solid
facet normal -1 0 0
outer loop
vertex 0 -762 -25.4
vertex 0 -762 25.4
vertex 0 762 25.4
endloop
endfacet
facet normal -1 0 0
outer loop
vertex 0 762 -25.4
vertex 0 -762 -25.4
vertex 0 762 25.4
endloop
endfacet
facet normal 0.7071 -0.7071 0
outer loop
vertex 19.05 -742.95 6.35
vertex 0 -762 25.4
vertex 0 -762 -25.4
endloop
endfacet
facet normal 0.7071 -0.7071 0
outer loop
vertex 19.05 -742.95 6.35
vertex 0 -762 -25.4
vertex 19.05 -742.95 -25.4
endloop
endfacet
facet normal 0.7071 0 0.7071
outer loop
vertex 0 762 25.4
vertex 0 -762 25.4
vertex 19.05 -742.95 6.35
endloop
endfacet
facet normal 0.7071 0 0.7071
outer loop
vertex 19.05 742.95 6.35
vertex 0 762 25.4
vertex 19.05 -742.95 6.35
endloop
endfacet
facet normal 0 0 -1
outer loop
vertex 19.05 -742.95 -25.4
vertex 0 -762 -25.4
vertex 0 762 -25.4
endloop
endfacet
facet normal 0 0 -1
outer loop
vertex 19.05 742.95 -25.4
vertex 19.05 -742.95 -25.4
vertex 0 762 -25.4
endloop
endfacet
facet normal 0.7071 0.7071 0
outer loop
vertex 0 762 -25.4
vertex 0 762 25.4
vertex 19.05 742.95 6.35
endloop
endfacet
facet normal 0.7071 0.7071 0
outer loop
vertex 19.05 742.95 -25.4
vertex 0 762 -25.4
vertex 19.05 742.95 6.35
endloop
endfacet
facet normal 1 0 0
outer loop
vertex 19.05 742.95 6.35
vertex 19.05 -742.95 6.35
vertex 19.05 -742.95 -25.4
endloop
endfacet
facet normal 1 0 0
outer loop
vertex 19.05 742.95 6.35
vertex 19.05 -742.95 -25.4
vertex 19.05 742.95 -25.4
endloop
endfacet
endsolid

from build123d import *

# Parameters (mm, degrees)
F0_W     = 1524
F0_H     = 50.8
F1_DEPTH = 19.05
F3_DEPTH = 50.801
F5_DEPTH = 1524.001


# Not quite as in the source:
# - a pattern or mirror of a feature is missing from the dataset's text; its kind, count and spacing are read off the source's solid


with BuildPart() as f1:
    # F0 (on Right) → F1 (new body)
    with BuildSketch(Plane.YZ):
        Rectangle(F0_W, F0_H)
    extrude(amount=F1_DEPTH)

    # F2 (on face) → F3 (cut, through all)
    with BuildSketch(Plane.XY.offset(25.4)):
        Polygon((19.05, 762), (0, 762), (19.05, 742.95), align=None)
    f3 = extrude(amount=-F3_DEPTH, mode=Mode.SUBTRACT)

    # F3_copies: F3 across plane
    add(f3.mirror(Plane(origin=(0, 0, 0), x_dir=(0, 0, -1), z_dir=(0, -1, 0))), mode=Mode.SUBTRACT)

    # F4 (on face) → F5 (cut, through all)
    with BuildSketch(Plane.XZ.offset(762)):
        Polygon((19.05, 25.4), (0, 25.4), (19.05, 6.35), align=None)
    extrude(amount=-F5_DEPTH, mode=Mode.SUBTRACT)


solid = f1.part
